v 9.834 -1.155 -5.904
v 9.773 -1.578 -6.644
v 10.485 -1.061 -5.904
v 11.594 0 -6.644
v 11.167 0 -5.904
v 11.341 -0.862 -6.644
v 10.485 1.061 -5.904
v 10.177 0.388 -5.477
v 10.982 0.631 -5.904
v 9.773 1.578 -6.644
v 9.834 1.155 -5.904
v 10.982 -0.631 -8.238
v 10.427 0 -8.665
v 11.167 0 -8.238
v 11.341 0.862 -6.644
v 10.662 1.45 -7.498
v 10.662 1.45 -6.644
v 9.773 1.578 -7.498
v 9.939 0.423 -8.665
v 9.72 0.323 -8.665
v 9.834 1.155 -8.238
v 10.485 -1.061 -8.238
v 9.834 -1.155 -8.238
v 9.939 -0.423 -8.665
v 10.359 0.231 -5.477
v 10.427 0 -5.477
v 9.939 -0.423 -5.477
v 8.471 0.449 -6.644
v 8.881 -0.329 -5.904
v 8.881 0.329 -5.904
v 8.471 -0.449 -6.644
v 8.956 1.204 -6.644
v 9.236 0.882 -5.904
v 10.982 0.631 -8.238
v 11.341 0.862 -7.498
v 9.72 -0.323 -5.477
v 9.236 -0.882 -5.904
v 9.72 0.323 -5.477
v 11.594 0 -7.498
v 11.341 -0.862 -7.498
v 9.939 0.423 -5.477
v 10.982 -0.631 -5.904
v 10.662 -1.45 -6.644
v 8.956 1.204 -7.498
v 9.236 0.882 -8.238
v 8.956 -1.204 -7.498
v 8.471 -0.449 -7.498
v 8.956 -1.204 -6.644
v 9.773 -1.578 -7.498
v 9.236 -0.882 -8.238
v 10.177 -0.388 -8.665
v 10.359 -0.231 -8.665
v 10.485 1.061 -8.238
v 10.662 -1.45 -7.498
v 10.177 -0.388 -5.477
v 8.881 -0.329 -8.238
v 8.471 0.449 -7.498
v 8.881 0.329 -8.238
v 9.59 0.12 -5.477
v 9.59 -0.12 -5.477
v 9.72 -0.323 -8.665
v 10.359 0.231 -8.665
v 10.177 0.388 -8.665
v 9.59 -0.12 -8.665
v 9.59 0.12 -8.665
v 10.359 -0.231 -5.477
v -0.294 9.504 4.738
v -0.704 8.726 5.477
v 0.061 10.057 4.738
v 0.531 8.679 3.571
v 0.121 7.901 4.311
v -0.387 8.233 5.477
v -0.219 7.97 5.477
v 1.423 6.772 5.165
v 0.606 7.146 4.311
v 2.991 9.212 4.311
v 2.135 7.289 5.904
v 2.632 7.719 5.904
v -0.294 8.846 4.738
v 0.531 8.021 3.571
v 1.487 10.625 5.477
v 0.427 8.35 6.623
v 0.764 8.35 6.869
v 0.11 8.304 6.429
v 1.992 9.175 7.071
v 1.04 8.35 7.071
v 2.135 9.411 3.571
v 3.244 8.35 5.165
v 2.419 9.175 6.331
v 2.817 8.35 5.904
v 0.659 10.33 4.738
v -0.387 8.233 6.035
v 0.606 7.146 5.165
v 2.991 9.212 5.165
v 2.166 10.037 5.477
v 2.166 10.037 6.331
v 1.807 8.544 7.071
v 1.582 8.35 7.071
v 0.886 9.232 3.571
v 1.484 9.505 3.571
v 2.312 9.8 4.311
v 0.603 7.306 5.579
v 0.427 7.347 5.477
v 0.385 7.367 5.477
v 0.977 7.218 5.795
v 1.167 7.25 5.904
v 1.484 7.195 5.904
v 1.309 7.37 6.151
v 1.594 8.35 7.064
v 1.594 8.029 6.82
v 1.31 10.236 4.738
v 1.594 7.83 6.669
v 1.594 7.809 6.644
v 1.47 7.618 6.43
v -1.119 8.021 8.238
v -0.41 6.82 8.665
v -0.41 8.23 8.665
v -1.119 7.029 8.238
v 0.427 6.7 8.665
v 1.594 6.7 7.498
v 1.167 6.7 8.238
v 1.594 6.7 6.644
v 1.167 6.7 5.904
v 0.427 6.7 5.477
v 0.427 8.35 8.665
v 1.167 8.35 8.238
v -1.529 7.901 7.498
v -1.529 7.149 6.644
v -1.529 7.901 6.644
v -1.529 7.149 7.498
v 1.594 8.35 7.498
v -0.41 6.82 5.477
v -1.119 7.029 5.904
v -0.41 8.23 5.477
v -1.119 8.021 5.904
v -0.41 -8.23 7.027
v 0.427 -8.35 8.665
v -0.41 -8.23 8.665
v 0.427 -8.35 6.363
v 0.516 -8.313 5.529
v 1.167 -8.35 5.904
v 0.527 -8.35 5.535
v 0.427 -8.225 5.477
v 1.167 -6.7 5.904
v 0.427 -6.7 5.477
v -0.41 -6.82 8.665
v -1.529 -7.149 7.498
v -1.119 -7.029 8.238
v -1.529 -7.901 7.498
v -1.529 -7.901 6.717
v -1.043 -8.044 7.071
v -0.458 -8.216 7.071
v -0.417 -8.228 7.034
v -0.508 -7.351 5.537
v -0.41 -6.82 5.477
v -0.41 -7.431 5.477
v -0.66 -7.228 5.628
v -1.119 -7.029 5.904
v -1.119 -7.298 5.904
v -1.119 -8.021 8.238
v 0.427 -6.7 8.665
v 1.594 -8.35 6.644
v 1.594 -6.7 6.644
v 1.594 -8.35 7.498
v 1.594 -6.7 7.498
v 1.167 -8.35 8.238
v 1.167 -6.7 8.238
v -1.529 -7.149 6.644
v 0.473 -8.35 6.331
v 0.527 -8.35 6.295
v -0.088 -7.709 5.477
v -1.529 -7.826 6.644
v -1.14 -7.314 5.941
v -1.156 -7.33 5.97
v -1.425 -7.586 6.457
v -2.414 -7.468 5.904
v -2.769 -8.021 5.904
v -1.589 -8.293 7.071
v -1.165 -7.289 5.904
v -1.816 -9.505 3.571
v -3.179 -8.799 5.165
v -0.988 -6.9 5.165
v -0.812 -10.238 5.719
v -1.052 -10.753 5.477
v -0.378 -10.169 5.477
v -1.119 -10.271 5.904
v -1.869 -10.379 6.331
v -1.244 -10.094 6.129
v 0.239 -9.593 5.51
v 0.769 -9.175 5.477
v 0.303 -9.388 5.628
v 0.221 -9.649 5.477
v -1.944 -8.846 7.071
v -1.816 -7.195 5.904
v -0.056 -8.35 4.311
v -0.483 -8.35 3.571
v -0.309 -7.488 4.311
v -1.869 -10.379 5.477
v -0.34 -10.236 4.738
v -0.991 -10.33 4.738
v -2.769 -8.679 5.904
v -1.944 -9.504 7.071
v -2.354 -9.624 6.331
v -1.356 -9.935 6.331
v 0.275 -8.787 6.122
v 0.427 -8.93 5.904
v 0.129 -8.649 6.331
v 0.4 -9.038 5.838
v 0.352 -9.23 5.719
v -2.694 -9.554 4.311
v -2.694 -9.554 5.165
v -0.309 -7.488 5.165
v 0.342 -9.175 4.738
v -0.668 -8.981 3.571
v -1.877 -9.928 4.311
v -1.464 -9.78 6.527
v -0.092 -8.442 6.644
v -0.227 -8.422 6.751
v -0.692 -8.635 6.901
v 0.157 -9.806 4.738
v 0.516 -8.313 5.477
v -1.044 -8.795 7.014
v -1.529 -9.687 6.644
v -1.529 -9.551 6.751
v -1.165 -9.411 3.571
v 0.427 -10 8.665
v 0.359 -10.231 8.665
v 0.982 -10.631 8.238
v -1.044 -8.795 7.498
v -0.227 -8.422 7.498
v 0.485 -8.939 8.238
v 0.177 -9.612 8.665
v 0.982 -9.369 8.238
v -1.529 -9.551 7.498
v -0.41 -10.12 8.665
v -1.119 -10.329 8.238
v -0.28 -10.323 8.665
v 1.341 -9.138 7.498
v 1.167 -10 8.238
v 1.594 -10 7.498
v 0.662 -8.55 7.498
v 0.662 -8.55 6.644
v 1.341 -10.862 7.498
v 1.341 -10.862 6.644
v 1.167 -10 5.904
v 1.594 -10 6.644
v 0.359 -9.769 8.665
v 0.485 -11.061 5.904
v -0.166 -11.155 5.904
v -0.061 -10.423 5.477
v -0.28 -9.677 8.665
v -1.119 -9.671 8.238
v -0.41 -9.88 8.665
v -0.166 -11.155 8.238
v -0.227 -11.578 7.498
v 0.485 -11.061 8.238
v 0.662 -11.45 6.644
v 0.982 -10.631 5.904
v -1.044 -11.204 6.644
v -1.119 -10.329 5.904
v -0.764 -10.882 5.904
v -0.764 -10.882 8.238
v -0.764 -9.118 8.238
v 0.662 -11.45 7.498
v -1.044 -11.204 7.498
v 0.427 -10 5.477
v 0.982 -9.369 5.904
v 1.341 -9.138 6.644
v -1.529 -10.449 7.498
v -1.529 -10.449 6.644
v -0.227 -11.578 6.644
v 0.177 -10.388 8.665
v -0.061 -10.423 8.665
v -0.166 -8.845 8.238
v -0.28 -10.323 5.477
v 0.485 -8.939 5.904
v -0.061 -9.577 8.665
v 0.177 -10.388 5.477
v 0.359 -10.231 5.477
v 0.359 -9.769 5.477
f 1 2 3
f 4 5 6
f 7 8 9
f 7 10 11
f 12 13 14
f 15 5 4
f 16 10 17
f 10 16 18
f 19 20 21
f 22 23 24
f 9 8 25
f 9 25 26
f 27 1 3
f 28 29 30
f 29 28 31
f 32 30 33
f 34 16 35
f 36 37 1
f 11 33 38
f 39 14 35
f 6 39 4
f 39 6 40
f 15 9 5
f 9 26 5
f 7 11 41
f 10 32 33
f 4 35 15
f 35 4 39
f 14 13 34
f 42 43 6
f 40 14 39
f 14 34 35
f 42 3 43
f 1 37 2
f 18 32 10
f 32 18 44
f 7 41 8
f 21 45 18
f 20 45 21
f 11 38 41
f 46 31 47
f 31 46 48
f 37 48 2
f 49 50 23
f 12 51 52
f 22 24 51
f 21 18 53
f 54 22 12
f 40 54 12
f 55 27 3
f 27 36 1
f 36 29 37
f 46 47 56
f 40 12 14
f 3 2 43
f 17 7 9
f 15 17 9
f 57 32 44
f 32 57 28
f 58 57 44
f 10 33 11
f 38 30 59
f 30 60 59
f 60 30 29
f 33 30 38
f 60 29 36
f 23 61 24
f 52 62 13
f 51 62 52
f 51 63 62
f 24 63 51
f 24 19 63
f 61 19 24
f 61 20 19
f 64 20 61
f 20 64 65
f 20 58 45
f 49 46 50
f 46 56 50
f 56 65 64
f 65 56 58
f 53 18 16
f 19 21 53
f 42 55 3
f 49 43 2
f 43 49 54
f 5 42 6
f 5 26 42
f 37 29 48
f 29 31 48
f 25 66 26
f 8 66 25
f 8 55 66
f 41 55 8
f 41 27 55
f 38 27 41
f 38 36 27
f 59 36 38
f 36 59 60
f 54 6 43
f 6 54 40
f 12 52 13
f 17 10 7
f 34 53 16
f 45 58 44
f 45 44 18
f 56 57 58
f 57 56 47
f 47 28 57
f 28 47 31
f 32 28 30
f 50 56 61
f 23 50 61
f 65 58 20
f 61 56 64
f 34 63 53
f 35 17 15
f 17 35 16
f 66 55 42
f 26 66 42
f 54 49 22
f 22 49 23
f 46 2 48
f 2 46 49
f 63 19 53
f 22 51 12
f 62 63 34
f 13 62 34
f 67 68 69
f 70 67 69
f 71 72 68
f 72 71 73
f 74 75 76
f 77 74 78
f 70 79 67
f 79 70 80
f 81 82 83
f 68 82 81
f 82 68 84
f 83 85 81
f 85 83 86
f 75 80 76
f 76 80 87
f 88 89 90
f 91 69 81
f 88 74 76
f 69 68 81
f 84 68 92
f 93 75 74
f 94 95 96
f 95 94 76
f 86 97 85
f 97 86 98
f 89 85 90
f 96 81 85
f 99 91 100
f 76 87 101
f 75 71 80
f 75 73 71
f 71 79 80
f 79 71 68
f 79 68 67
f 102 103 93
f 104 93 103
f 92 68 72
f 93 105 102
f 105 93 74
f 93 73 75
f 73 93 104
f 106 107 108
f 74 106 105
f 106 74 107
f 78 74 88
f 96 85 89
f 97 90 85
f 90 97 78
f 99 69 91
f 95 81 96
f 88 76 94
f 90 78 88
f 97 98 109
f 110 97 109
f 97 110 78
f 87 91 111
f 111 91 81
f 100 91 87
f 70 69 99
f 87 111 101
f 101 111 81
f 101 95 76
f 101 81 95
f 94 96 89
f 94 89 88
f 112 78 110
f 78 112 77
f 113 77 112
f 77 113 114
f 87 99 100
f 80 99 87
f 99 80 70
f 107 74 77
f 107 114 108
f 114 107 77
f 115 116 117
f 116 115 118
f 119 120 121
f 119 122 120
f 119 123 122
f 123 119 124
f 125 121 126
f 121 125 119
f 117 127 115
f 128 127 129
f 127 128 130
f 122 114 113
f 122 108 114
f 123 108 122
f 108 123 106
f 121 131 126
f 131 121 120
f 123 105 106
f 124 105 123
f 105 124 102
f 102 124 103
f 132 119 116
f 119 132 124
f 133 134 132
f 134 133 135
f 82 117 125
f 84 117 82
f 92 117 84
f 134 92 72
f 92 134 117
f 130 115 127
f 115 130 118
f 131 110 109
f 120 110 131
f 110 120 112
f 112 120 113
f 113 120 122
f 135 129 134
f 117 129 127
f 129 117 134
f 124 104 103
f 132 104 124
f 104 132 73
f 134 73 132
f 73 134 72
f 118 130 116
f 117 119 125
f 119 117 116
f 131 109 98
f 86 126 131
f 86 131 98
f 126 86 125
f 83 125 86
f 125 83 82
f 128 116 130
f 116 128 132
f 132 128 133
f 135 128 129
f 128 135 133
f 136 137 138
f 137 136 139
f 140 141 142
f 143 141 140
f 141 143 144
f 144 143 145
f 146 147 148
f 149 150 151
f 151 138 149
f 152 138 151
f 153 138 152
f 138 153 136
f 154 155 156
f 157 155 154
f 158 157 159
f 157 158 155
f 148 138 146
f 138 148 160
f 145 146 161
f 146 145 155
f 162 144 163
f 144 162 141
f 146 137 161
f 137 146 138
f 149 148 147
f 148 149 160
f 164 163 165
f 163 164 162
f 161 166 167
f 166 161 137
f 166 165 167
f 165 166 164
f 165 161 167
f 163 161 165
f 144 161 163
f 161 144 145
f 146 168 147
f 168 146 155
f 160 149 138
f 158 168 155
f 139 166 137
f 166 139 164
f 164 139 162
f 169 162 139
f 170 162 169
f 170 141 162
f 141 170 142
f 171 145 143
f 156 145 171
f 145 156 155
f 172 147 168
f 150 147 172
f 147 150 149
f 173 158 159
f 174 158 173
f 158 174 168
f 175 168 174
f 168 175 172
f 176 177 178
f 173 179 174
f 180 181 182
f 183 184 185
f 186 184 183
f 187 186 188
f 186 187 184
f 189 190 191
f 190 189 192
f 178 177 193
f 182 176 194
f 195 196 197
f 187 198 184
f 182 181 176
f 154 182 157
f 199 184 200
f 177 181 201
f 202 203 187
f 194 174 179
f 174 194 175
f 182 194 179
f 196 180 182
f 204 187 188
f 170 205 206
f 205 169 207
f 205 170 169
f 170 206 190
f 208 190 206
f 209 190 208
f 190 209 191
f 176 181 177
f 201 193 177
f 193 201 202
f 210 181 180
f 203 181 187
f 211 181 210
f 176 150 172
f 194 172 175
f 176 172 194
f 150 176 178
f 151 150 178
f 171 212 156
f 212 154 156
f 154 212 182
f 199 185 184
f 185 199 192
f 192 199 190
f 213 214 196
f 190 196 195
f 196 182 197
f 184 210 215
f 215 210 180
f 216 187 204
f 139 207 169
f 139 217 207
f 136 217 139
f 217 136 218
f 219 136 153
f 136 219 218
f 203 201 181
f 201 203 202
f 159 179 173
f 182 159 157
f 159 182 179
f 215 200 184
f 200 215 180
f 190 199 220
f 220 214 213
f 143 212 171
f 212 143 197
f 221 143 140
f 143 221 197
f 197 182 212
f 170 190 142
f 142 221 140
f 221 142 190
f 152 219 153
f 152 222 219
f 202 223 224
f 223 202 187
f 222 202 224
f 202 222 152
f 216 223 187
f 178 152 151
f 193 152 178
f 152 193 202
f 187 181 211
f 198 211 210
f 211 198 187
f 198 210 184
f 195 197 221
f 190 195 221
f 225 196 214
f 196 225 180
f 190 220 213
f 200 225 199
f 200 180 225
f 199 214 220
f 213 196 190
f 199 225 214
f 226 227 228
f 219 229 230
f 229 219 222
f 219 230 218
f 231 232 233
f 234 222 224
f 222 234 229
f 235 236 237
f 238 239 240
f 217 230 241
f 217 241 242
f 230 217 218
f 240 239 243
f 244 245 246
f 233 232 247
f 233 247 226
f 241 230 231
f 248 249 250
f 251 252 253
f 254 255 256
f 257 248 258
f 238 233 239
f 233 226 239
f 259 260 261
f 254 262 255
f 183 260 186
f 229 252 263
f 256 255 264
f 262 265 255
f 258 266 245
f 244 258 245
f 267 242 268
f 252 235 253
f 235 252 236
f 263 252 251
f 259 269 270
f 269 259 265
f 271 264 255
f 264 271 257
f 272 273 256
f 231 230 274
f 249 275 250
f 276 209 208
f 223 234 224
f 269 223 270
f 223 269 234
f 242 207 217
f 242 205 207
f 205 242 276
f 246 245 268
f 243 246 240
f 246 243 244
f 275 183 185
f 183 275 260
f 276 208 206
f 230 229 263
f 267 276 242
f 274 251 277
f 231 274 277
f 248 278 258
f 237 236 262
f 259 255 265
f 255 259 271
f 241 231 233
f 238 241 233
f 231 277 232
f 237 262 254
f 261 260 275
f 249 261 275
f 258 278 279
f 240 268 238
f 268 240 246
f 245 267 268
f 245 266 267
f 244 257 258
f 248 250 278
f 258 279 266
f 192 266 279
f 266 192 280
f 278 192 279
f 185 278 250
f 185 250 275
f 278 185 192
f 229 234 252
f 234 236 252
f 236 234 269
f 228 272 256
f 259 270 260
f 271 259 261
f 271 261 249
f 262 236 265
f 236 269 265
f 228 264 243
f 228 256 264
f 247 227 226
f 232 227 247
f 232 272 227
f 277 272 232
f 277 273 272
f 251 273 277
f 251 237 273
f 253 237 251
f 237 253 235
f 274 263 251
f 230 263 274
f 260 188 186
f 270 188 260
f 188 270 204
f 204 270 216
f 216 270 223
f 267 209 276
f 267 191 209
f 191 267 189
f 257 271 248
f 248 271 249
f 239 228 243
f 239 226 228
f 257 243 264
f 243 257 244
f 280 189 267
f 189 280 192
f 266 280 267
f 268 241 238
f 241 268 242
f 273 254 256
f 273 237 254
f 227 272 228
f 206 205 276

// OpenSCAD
// Generated by SolidPython 0.4.6 on 2020-02-11 11:42:53
$fa = .01;
$fs = 0.1;


color(c = "red") {
	scale(v = [10.0000000000, 10.0000000000, 10.0000000000]) {
		union() {
			translate(v = [1.0000000000, 0.0000000000, -0.7071067812]) {
				sphere(r = 0.1650000000);
			}
			hull() {
				difference() {
					hull() {
						translate(v = [0.0825000000, 0.9175000000, 0.5904341623]) {
							sphere(r = 0.1650000000);
						}
						translate(v = [0.1650000000, 0.8350000000, 0.4737615434]) {
							sphere(r = 0.1650000000);
						}
					}
					translate(v = [0.0825000000, 0.9175000000, 0.5904341623]) {
						sphere(r = 0.1650000000);
					}
					translate(v = [0.1650000000, 0.8350000000, 0.4737615434]) {
						sphere(r = 0.1650000000);
					}
				}
			}
			hull() {
				difference() {
					hull() {
						translate(v = [0.0000000000, 0.8350000000, 0.7071067812]) {
							sphere(r = 0.1650000000);
						}
						translate(v = [0.0000000000, 0.6700000000, 0.7071067812]) {
							sphere(r = 0.1650000000);
						}
					}
					translate(v = [0.0000000000, 0.8350000000, 0.7071067812]) {
						sphere(r = 0.1650000000);
					}
					translate(v = [0.0000000000, 0.6700000000, 0.7071067812]) {
						sphere(r = 0.1650000000);
					}
				}
			}
			hull() {
				difference() {
					hull() {
						translate(v = [0.0000000000, -0.8350000000, 0.7071067812]) {
							sphere(r = 0.1650000000);
						}
						translate(v = [0.0000000000, -0.6700000000, 0.7071067812]) {
							sphere(r = 0.1650000000);
						}
					}
					translate(v = [0.0000000000, -0.8350000000, 0.7071067812]) {
						sphere(r = 0.1650000000);
					}
					translate(v = [0.0000000000, -0.6700000000, 0.7071067812]) {
						sphere(r = 0.1650000000);
					}
				}
			}
			hull() {
				difference() {
					hull() {
						translate(v = [-0.0825000000, -0.9175000000, 0.5904341623]) {
							sphere(r = 0.1650000000);
						}
						translate(v = [-0.1650000000, -0.8350000000, 0.4737615434]) {
							sphere(r = 0.1650000000);
						}
					}
					translate(v = [-0.0825000000, -0.9175000000, 0.5904341623]) {
						sphere(r = 0.1650000000);
					}
					translate(v = [-0.1650000000, -0.8350000000, 0.4737615434]) {
						sphere(r = 0.1650000000);
					}
				}
			}
			translate(v = [0.0000000000, -1.0000000000, 0.7071067812]) {
				sphere(r = 0.1650000000);
			}
		}
	}
}
/***********************************************
*********      SolidPython code:      **********
************************************************
 
from typing import Iterable
from os.path import join as path_join

from solid import *
from solid.utils import *


def line(
    a: Tuple[float, float, float],
    b: Tuple[float, float, float],
    r: float = 1.0,
    capped=True,
):
    if capped:
        return hull()(translate(a)(sphere(r=r)), translate(b)(sphere(r=r)))
    else:
        return hull()(
            hull()(translate(a)(sphere(r=r)), translate(b)(sphere(r=r)))
            - translate(a)(sphere(r=r))
            - translate(b)(sphere(r=r))
        )


def mix(p1: Tuple[float, float, float], p2: Tuple[float, float, float], a: float):
    if len(p1) != len(p2):
        raise IndexError()
    return tuple((x * (1 - a)) + (y * a) for x, y in zip(p1, p2))


def pairwise_hull(objs: Iterable[OpenSCADObject]):
    return sum(hull()(a, b) for a, b in zip(objs, objs[1:]))


def generate_part(part, partname, resolution=0.1):
    scad_render_to_file(
        part,
        path_join("generated", f"{partname}.scad"),
        file_header=f"$fa = .01;\n$fs = {resolution};\n",
    )


__all__ = ["line", "mix", "pairwise_hull", "generate_part"]
 
 
************************************************/
